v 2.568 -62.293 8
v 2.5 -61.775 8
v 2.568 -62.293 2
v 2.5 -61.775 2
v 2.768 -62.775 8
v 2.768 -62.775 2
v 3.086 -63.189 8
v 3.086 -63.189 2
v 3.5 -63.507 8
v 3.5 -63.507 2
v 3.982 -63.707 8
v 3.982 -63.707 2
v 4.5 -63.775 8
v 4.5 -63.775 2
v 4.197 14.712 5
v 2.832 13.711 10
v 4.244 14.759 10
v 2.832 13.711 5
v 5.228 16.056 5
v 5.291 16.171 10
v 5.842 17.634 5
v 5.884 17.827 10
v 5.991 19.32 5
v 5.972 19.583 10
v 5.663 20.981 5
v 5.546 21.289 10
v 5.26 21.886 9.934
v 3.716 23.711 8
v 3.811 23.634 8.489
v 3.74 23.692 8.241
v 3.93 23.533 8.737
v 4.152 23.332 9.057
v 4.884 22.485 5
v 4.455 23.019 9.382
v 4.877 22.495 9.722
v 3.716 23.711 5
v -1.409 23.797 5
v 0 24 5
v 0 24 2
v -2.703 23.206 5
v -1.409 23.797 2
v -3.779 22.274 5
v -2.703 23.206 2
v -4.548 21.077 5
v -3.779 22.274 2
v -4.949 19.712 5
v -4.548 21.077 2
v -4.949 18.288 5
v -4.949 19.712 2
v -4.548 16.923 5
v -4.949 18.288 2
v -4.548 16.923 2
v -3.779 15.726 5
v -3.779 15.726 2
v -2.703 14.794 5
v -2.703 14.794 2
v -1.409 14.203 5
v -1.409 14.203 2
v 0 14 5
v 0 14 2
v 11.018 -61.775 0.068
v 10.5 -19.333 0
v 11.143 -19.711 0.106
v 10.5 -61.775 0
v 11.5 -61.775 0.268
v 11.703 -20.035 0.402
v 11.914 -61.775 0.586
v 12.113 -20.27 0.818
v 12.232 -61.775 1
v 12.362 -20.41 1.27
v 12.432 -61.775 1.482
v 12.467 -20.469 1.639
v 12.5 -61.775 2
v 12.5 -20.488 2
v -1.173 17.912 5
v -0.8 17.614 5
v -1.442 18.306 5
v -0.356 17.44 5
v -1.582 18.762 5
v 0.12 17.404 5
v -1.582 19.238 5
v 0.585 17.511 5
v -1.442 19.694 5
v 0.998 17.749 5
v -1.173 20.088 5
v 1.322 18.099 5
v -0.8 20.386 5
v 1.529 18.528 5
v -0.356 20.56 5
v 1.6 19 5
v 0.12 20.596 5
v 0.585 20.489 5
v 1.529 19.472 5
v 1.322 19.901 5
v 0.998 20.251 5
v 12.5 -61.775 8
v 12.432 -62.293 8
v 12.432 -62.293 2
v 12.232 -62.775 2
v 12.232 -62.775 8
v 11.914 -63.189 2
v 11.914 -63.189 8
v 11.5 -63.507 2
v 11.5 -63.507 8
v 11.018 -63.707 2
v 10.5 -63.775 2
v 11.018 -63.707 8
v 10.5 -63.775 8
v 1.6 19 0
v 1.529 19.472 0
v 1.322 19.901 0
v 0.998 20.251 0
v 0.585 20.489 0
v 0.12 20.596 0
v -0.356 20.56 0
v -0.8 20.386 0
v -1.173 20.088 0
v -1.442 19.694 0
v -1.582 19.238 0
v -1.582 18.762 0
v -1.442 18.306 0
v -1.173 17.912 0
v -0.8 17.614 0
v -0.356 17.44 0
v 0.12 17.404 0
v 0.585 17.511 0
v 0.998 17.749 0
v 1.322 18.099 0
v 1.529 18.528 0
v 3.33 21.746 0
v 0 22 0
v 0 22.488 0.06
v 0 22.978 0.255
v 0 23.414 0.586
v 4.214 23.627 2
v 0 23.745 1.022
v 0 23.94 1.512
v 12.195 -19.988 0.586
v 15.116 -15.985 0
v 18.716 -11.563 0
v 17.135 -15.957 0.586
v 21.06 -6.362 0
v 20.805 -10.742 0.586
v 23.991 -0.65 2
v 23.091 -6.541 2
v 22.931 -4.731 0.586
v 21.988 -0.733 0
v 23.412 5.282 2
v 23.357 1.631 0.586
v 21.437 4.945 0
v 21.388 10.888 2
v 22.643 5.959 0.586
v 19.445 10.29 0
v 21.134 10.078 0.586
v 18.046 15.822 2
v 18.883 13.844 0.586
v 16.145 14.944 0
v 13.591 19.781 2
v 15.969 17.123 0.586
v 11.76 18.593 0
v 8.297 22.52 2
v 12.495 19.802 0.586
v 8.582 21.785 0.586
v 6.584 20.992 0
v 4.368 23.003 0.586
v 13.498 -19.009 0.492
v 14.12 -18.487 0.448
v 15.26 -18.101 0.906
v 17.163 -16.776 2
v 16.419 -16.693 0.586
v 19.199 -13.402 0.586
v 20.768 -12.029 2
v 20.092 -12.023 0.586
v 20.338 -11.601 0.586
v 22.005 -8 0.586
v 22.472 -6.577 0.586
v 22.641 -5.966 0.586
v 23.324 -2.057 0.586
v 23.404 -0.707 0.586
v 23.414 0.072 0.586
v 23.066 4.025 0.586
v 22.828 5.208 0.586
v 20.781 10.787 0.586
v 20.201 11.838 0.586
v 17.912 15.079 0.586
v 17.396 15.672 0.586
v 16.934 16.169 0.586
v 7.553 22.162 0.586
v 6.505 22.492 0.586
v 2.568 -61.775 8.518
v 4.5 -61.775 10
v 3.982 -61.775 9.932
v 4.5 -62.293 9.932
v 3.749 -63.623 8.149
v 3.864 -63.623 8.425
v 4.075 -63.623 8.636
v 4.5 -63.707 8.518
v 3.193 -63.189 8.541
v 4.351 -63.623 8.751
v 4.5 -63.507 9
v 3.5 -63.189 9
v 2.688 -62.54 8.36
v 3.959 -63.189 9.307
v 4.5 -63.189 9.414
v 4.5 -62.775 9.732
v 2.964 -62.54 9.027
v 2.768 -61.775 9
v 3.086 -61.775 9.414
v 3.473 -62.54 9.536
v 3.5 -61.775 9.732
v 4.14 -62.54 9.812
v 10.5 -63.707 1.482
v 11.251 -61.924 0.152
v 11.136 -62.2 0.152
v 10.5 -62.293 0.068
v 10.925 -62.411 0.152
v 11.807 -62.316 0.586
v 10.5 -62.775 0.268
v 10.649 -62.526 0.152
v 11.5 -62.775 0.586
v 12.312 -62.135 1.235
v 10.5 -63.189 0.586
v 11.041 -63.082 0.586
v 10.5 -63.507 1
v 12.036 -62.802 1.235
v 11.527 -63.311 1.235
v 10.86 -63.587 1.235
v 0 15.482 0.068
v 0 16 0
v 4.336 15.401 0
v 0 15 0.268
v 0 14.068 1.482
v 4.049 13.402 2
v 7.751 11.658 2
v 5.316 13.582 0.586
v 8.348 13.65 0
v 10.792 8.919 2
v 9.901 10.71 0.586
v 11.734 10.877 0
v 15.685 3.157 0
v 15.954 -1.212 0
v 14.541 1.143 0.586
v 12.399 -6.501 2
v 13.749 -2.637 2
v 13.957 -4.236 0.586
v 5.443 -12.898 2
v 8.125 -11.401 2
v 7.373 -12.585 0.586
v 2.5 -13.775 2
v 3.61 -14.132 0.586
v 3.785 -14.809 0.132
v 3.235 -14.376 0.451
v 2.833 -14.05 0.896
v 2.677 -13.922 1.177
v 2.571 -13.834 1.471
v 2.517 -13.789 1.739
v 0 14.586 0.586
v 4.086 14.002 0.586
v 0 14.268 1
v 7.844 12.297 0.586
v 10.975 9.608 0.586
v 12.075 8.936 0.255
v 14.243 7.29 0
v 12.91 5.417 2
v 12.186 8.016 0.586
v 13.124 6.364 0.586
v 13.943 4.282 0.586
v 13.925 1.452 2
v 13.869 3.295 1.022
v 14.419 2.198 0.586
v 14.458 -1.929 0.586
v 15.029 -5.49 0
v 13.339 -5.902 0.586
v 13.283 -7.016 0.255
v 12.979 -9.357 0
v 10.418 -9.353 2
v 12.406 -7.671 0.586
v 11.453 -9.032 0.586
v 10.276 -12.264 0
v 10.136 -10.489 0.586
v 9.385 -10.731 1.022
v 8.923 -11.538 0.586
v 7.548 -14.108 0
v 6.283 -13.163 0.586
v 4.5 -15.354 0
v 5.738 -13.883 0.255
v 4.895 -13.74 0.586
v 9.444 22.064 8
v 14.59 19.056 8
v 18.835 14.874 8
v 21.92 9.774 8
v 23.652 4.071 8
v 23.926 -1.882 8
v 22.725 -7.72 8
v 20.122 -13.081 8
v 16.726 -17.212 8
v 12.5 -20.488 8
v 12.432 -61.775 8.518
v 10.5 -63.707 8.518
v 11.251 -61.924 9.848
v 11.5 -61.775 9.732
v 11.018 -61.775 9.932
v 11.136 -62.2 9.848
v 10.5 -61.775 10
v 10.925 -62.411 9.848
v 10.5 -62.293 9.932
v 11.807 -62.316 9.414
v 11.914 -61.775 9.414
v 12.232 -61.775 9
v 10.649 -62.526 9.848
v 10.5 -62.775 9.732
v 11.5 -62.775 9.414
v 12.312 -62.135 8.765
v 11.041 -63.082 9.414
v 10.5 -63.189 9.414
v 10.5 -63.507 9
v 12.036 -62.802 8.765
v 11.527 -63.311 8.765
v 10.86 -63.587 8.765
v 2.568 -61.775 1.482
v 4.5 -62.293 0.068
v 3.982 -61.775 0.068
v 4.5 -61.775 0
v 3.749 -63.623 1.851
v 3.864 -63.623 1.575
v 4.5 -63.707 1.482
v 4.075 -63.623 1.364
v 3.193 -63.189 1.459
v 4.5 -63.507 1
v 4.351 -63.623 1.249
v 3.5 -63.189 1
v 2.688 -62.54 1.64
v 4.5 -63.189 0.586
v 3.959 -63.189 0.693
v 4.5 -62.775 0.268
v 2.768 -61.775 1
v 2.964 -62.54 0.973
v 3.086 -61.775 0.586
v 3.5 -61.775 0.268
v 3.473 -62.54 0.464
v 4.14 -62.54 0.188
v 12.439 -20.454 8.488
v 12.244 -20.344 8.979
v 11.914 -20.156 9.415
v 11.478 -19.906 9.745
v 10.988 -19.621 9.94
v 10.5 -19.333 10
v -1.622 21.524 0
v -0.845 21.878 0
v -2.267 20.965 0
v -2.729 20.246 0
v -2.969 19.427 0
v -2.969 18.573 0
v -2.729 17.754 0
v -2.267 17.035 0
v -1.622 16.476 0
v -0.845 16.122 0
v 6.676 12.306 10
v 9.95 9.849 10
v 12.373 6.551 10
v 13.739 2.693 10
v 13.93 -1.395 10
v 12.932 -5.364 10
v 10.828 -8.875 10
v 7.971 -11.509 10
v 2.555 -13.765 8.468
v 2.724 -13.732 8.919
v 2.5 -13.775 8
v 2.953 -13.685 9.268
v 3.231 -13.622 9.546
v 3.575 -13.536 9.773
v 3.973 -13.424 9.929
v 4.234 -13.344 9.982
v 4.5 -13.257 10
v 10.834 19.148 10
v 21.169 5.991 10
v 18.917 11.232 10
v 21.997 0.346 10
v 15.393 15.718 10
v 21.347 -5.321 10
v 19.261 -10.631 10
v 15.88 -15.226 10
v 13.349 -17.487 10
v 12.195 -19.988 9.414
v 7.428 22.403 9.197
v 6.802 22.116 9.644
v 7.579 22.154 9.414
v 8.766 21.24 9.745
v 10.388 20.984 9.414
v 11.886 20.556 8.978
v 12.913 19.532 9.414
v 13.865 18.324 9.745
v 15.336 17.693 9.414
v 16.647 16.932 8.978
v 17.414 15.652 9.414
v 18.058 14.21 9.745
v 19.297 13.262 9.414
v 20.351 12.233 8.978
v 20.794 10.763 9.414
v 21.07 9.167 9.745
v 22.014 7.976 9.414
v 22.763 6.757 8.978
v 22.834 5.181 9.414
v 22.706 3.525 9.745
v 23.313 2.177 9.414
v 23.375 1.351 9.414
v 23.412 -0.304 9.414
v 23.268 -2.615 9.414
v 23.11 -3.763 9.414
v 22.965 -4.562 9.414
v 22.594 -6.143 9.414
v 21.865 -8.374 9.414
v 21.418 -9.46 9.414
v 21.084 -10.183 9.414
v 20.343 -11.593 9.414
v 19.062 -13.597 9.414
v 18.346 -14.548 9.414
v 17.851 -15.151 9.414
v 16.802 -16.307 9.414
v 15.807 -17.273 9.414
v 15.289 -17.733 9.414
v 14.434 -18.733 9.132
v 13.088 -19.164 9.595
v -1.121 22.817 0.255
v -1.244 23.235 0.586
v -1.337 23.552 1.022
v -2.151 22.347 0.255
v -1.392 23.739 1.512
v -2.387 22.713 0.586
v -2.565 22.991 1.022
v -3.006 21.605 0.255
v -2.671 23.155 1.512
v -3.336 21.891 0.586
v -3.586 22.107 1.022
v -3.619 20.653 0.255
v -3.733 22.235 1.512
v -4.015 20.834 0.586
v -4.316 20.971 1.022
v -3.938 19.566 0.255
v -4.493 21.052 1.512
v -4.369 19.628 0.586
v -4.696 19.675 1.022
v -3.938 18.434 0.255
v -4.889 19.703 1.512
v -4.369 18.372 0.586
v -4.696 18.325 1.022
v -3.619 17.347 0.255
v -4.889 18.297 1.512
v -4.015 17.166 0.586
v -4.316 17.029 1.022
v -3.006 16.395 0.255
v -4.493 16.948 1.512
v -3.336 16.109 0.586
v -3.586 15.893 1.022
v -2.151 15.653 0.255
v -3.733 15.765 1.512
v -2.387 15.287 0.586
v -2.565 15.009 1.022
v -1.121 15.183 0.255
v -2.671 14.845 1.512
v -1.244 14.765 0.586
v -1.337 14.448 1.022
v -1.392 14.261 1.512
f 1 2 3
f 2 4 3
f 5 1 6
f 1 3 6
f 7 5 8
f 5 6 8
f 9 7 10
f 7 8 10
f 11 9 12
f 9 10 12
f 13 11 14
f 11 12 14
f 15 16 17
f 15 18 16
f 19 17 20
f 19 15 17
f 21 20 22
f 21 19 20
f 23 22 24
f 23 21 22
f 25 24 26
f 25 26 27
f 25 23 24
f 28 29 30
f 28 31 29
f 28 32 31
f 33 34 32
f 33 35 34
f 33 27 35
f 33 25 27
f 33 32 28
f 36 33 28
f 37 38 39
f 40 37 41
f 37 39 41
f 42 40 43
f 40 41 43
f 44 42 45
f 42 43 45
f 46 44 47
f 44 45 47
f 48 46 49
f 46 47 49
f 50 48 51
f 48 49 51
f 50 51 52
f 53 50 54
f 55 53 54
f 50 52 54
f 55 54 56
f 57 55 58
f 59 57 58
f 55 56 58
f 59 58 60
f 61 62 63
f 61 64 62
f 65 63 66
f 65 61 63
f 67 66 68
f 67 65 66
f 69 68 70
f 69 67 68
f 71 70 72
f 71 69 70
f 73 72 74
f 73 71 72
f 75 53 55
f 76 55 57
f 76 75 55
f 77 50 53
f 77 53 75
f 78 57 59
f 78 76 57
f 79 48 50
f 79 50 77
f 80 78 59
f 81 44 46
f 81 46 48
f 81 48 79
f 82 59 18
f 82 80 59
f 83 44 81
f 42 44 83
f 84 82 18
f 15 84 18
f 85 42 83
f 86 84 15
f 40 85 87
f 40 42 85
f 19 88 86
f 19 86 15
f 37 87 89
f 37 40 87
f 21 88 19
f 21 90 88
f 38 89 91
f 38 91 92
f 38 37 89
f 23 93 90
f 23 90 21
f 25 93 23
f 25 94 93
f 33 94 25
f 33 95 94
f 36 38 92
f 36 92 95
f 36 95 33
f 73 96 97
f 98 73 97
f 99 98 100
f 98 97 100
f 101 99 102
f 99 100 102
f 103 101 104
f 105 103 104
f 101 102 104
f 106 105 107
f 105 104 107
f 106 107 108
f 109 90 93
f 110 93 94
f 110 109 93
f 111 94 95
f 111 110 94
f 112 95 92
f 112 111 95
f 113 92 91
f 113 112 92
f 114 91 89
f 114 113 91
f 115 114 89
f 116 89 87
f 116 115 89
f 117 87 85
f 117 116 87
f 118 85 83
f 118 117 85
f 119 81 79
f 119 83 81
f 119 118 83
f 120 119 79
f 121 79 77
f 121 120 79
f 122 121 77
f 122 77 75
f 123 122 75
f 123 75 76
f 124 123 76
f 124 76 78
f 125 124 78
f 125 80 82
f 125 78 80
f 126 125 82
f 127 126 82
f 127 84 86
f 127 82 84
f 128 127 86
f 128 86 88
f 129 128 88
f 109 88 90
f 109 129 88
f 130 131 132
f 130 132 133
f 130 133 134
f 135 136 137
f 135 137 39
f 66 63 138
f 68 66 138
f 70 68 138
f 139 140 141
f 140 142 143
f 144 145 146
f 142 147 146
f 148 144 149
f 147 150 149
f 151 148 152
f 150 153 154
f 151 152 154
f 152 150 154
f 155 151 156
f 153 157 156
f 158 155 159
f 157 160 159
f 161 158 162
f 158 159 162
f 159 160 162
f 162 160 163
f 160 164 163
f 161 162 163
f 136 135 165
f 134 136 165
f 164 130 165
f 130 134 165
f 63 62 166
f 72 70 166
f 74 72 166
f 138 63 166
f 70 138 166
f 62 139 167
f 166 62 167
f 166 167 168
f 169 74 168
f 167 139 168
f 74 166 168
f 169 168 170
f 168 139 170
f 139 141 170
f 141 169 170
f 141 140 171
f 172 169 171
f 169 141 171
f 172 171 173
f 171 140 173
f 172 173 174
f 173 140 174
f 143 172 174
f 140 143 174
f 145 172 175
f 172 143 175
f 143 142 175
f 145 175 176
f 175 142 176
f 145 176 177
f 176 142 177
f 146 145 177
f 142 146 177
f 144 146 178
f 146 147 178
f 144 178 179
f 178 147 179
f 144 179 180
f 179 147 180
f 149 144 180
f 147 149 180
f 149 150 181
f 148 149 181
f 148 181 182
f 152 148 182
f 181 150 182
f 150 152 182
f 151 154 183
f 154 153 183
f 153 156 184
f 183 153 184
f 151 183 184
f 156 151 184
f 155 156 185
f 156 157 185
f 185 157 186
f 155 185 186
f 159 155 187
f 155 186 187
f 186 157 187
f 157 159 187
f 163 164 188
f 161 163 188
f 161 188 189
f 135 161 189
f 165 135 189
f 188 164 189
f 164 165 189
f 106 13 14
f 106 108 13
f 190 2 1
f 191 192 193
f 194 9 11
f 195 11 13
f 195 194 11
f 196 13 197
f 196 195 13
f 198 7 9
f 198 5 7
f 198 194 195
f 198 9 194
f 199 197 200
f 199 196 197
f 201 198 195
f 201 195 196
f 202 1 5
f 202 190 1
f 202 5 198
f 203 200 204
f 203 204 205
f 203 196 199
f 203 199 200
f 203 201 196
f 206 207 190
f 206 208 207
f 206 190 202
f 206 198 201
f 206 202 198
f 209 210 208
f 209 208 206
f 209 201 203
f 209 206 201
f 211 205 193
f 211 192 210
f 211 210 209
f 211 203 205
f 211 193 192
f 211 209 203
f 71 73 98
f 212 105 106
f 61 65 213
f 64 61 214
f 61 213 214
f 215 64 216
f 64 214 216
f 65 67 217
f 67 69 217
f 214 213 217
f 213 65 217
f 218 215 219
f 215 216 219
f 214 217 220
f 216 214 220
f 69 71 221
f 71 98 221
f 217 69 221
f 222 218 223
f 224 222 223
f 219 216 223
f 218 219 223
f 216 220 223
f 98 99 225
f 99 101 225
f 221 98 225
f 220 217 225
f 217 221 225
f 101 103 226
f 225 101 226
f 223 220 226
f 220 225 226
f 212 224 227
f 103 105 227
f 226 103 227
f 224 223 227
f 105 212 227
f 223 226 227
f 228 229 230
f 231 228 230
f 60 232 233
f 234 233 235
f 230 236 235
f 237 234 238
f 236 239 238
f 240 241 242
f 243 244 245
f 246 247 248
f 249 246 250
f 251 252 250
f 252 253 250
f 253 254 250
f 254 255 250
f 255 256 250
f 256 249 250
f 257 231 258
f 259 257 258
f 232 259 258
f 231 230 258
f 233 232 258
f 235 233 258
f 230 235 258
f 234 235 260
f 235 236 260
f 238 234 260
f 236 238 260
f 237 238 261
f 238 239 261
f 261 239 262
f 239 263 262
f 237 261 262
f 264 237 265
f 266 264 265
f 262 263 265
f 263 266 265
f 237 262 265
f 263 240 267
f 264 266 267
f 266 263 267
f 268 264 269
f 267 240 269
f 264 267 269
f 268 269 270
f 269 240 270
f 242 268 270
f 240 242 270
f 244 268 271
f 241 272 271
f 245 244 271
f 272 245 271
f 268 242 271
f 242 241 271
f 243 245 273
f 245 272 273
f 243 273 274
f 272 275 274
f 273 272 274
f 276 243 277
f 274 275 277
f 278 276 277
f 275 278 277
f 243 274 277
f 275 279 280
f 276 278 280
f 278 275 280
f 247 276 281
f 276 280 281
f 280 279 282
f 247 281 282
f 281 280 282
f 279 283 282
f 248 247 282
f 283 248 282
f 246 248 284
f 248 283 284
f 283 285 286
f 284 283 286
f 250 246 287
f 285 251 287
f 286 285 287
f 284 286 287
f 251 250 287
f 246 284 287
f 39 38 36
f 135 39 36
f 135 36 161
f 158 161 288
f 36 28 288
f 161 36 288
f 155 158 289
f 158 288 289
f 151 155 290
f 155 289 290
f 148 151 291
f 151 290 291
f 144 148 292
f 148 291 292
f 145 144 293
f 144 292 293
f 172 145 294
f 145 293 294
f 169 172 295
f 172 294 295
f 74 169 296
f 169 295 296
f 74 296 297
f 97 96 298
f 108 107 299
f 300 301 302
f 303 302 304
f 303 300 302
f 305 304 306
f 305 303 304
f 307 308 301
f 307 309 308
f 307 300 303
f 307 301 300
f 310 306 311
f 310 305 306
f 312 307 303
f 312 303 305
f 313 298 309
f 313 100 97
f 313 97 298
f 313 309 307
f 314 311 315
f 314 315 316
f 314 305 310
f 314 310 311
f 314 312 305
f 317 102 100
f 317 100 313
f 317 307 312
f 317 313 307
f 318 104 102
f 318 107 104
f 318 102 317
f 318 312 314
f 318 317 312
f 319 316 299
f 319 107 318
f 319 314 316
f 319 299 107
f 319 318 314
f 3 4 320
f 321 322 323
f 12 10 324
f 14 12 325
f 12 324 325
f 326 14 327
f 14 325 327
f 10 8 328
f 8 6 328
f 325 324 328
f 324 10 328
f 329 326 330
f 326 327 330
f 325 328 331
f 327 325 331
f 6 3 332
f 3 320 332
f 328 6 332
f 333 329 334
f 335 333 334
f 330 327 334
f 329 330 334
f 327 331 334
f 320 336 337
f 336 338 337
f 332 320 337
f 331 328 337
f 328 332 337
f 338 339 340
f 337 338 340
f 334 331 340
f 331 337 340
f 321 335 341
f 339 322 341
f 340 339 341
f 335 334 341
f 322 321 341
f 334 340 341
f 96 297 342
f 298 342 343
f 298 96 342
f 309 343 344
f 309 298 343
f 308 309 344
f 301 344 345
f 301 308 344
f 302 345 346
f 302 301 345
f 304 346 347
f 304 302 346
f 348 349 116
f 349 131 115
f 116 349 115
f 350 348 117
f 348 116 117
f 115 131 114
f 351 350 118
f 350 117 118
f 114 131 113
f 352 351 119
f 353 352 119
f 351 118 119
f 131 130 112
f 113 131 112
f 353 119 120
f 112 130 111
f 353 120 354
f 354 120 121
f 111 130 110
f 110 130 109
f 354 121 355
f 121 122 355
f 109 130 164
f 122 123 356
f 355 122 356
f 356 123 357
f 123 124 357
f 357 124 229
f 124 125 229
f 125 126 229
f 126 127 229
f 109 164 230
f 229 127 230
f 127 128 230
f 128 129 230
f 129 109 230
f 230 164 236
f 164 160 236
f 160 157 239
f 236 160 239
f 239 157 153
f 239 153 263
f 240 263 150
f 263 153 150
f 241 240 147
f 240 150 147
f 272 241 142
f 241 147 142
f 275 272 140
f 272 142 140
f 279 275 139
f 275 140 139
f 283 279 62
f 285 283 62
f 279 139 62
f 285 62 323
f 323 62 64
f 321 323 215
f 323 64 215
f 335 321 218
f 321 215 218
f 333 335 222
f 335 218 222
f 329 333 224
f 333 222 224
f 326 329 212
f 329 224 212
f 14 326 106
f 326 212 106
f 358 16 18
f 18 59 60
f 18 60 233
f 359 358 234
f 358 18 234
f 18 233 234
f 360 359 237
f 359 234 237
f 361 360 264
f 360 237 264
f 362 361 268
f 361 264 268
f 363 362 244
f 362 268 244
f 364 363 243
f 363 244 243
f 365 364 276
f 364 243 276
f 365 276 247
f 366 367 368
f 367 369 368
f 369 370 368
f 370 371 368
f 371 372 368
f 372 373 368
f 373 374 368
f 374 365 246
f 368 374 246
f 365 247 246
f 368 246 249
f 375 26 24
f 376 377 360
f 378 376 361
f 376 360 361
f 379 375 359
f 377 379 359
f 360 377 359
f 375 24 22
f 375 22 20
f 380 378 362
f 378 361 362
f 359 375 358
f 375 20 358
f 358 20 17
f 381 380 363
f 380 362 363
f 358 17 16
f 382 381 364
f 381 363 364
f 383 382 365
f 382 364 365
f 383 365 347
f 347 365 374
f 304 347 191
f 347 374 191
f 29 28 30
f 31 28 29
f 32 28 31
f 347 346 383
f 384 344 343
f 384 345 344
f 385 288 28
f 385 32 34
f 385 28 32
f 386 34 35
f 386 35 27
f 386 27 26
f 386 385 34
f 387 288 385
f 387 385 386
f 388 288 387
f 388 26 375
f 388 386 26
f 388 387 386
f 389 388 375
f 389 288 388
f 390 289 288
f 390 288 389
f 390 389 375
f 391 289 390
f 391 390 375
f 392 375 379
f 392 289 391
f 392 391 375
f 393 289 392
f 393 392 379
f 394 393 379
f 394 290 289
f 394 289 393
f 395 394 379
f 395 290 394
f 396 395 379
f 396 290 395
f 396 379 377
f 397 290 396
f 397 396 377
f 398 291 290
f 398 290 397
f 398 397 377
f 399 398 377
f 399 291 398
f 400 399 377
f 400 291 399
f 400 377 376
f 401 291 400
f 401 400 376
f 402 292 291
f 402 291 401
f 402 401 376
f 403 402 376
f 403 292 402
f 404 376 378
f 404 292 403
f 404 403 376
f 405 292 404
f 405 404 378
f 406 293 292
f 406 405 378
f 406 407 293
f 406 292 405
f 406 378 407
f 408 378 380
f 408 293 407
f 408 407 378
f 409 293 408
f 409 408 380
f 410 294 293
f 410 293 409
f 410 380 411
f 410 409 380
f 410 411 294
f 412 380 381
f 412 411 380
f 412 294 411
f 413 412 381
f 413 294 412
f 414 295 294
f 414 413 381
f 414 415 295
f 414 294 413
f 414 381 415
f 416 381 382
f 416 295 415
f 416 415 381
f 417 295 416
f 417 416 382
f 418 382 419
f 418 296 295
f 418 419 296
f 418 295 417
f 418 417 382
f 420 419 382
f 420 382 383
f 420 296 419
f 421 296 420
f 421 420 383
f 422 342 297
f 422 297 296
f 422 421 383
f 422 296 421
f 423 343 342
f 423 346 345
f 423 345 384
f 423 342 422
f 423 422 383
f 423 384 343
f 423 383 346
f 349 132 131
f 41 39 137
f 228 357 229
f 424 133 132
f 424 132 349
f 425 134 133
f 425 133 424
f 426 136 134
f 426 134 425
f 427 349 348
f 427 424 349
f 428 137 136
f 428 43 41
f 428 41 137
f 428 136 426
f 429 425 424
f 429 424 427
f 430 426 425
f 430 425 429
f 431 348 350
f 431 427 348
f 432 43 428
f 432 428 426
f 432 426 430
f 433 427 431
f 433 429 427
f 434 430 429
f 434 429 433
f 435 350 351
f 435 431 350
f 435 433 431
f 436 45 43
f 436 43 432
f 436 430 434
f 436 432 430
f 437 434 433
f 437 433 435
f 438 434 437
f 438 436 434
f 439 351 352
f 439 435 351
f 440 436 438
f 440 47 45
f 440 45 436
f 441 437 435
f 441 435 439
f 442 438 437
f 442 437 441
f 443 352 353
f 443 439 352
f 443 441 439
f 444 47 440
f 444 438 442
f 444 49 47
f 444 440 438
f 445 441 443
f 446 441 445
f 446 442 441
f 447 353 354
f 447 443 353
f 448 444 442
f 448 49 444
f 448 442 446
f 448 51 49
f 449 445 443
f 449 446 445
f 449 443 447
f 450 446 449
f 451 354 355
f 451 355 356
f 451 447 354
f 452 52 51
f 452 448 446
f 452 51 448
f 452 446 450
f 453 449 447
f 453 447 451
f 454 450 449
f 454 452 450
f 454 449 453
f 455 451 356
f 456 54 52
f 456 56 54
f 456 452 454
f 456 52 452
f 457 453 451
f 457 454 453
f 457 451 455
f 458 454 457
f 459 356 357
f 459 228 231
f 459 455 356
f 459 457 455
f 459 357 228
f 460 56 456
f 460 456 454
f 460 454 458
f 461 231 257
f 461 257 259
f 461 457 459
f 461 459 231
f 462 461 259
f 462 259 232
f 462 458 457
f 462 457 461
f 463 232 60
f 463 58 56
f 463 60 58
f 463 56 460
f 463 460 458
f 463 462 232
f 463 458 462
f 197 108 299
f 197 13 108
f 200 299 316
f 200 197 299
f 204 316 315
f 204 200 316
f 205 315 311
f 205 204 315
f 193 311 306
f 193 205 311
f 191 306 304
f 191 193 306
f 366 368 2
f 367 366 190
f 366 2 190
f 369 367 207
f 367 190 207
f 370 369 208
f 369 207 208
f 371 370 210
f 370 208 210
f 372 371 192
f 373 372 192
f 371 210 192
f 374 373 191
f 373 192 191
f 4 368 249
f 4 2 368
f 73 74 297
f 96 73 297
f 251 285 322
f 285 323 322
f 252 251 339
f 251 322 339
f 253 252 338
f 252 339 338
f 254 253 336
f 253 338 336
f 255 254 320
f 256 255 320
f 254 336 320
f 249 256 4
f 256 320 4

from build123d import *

# Parameters (mm, degrees)
F2_W     = 10
F2_H     = 10
F4_R     = 5
F5_DEPTH = 5
F6_R     = 6
F7_DEPTH = 5.0010001
F8_R     = 1.6
F9_DEPTH = 10.0010001
F10_R    = 2


with BuildPart() as f3:
    # F3: sweep along a path in F0
    with BuildLine(Plane.XY) as f3_path:
        ThreePointArc((0, 14), (13.943630847, 1.2550533066), (2.5, -13.774977314))
        Line((2.5, -13.774977314), (2.5, -63.774977314))
    # F2 (on plane+point) → F3 (sweep)
    with BuildSketch(Plane.XZ.offset(63.774977314)):
        with Locations((7.5, 5)):
            Rectangle(F2_W, F2_H)
    sweep(path=f3_path.line, transition=Transition.RIGHT)

    # F4 (on Top) → F5 (join)
    with BuildSketch(Plane.XY):
        with Locations((0, 19)):
            Circle(F4_R)
    extrude(amount=F5_DEPTH)

    # F6 (on face) → F7 (cut, through all)
    with BuildSketch(Plane.XY.offset(5)):
        with Locations((0, 19)):
            Circle(F6_R)
    extrude(amount=F7_DEPTH, mode=Mode.SUBTRACT)

    # F8 (on Top) → F9 (cut, through all)
    with BuildSketch(Plane.XY):
        with Locations((0, 19)):
            Circle(F8_R)
    extrude(amount=F9_DEPTH, mode=Mode.SUBTRACT)

    # F10
    f10_edges = [f3.edges().sort_by_distance(p)[0] for p in [
        (2.5, -38.774977, 10),
        (2.5, -38.774977, 0),
        (2.5, -63.774977, 5),
        (12.5, -63.774977, 5),
        (12.5, -42.131389, 10),
        (23.539652, 4.67812, 10),
        (12.5, -42.131389, 0),
        (7.5, -63.774977, 0),
        (7.5, -63.774977, 10),
        (13.943631, 1.255053, 0),
    ]]
    fillet(f10_edges, radius=F10_R)


solid = f3.part
